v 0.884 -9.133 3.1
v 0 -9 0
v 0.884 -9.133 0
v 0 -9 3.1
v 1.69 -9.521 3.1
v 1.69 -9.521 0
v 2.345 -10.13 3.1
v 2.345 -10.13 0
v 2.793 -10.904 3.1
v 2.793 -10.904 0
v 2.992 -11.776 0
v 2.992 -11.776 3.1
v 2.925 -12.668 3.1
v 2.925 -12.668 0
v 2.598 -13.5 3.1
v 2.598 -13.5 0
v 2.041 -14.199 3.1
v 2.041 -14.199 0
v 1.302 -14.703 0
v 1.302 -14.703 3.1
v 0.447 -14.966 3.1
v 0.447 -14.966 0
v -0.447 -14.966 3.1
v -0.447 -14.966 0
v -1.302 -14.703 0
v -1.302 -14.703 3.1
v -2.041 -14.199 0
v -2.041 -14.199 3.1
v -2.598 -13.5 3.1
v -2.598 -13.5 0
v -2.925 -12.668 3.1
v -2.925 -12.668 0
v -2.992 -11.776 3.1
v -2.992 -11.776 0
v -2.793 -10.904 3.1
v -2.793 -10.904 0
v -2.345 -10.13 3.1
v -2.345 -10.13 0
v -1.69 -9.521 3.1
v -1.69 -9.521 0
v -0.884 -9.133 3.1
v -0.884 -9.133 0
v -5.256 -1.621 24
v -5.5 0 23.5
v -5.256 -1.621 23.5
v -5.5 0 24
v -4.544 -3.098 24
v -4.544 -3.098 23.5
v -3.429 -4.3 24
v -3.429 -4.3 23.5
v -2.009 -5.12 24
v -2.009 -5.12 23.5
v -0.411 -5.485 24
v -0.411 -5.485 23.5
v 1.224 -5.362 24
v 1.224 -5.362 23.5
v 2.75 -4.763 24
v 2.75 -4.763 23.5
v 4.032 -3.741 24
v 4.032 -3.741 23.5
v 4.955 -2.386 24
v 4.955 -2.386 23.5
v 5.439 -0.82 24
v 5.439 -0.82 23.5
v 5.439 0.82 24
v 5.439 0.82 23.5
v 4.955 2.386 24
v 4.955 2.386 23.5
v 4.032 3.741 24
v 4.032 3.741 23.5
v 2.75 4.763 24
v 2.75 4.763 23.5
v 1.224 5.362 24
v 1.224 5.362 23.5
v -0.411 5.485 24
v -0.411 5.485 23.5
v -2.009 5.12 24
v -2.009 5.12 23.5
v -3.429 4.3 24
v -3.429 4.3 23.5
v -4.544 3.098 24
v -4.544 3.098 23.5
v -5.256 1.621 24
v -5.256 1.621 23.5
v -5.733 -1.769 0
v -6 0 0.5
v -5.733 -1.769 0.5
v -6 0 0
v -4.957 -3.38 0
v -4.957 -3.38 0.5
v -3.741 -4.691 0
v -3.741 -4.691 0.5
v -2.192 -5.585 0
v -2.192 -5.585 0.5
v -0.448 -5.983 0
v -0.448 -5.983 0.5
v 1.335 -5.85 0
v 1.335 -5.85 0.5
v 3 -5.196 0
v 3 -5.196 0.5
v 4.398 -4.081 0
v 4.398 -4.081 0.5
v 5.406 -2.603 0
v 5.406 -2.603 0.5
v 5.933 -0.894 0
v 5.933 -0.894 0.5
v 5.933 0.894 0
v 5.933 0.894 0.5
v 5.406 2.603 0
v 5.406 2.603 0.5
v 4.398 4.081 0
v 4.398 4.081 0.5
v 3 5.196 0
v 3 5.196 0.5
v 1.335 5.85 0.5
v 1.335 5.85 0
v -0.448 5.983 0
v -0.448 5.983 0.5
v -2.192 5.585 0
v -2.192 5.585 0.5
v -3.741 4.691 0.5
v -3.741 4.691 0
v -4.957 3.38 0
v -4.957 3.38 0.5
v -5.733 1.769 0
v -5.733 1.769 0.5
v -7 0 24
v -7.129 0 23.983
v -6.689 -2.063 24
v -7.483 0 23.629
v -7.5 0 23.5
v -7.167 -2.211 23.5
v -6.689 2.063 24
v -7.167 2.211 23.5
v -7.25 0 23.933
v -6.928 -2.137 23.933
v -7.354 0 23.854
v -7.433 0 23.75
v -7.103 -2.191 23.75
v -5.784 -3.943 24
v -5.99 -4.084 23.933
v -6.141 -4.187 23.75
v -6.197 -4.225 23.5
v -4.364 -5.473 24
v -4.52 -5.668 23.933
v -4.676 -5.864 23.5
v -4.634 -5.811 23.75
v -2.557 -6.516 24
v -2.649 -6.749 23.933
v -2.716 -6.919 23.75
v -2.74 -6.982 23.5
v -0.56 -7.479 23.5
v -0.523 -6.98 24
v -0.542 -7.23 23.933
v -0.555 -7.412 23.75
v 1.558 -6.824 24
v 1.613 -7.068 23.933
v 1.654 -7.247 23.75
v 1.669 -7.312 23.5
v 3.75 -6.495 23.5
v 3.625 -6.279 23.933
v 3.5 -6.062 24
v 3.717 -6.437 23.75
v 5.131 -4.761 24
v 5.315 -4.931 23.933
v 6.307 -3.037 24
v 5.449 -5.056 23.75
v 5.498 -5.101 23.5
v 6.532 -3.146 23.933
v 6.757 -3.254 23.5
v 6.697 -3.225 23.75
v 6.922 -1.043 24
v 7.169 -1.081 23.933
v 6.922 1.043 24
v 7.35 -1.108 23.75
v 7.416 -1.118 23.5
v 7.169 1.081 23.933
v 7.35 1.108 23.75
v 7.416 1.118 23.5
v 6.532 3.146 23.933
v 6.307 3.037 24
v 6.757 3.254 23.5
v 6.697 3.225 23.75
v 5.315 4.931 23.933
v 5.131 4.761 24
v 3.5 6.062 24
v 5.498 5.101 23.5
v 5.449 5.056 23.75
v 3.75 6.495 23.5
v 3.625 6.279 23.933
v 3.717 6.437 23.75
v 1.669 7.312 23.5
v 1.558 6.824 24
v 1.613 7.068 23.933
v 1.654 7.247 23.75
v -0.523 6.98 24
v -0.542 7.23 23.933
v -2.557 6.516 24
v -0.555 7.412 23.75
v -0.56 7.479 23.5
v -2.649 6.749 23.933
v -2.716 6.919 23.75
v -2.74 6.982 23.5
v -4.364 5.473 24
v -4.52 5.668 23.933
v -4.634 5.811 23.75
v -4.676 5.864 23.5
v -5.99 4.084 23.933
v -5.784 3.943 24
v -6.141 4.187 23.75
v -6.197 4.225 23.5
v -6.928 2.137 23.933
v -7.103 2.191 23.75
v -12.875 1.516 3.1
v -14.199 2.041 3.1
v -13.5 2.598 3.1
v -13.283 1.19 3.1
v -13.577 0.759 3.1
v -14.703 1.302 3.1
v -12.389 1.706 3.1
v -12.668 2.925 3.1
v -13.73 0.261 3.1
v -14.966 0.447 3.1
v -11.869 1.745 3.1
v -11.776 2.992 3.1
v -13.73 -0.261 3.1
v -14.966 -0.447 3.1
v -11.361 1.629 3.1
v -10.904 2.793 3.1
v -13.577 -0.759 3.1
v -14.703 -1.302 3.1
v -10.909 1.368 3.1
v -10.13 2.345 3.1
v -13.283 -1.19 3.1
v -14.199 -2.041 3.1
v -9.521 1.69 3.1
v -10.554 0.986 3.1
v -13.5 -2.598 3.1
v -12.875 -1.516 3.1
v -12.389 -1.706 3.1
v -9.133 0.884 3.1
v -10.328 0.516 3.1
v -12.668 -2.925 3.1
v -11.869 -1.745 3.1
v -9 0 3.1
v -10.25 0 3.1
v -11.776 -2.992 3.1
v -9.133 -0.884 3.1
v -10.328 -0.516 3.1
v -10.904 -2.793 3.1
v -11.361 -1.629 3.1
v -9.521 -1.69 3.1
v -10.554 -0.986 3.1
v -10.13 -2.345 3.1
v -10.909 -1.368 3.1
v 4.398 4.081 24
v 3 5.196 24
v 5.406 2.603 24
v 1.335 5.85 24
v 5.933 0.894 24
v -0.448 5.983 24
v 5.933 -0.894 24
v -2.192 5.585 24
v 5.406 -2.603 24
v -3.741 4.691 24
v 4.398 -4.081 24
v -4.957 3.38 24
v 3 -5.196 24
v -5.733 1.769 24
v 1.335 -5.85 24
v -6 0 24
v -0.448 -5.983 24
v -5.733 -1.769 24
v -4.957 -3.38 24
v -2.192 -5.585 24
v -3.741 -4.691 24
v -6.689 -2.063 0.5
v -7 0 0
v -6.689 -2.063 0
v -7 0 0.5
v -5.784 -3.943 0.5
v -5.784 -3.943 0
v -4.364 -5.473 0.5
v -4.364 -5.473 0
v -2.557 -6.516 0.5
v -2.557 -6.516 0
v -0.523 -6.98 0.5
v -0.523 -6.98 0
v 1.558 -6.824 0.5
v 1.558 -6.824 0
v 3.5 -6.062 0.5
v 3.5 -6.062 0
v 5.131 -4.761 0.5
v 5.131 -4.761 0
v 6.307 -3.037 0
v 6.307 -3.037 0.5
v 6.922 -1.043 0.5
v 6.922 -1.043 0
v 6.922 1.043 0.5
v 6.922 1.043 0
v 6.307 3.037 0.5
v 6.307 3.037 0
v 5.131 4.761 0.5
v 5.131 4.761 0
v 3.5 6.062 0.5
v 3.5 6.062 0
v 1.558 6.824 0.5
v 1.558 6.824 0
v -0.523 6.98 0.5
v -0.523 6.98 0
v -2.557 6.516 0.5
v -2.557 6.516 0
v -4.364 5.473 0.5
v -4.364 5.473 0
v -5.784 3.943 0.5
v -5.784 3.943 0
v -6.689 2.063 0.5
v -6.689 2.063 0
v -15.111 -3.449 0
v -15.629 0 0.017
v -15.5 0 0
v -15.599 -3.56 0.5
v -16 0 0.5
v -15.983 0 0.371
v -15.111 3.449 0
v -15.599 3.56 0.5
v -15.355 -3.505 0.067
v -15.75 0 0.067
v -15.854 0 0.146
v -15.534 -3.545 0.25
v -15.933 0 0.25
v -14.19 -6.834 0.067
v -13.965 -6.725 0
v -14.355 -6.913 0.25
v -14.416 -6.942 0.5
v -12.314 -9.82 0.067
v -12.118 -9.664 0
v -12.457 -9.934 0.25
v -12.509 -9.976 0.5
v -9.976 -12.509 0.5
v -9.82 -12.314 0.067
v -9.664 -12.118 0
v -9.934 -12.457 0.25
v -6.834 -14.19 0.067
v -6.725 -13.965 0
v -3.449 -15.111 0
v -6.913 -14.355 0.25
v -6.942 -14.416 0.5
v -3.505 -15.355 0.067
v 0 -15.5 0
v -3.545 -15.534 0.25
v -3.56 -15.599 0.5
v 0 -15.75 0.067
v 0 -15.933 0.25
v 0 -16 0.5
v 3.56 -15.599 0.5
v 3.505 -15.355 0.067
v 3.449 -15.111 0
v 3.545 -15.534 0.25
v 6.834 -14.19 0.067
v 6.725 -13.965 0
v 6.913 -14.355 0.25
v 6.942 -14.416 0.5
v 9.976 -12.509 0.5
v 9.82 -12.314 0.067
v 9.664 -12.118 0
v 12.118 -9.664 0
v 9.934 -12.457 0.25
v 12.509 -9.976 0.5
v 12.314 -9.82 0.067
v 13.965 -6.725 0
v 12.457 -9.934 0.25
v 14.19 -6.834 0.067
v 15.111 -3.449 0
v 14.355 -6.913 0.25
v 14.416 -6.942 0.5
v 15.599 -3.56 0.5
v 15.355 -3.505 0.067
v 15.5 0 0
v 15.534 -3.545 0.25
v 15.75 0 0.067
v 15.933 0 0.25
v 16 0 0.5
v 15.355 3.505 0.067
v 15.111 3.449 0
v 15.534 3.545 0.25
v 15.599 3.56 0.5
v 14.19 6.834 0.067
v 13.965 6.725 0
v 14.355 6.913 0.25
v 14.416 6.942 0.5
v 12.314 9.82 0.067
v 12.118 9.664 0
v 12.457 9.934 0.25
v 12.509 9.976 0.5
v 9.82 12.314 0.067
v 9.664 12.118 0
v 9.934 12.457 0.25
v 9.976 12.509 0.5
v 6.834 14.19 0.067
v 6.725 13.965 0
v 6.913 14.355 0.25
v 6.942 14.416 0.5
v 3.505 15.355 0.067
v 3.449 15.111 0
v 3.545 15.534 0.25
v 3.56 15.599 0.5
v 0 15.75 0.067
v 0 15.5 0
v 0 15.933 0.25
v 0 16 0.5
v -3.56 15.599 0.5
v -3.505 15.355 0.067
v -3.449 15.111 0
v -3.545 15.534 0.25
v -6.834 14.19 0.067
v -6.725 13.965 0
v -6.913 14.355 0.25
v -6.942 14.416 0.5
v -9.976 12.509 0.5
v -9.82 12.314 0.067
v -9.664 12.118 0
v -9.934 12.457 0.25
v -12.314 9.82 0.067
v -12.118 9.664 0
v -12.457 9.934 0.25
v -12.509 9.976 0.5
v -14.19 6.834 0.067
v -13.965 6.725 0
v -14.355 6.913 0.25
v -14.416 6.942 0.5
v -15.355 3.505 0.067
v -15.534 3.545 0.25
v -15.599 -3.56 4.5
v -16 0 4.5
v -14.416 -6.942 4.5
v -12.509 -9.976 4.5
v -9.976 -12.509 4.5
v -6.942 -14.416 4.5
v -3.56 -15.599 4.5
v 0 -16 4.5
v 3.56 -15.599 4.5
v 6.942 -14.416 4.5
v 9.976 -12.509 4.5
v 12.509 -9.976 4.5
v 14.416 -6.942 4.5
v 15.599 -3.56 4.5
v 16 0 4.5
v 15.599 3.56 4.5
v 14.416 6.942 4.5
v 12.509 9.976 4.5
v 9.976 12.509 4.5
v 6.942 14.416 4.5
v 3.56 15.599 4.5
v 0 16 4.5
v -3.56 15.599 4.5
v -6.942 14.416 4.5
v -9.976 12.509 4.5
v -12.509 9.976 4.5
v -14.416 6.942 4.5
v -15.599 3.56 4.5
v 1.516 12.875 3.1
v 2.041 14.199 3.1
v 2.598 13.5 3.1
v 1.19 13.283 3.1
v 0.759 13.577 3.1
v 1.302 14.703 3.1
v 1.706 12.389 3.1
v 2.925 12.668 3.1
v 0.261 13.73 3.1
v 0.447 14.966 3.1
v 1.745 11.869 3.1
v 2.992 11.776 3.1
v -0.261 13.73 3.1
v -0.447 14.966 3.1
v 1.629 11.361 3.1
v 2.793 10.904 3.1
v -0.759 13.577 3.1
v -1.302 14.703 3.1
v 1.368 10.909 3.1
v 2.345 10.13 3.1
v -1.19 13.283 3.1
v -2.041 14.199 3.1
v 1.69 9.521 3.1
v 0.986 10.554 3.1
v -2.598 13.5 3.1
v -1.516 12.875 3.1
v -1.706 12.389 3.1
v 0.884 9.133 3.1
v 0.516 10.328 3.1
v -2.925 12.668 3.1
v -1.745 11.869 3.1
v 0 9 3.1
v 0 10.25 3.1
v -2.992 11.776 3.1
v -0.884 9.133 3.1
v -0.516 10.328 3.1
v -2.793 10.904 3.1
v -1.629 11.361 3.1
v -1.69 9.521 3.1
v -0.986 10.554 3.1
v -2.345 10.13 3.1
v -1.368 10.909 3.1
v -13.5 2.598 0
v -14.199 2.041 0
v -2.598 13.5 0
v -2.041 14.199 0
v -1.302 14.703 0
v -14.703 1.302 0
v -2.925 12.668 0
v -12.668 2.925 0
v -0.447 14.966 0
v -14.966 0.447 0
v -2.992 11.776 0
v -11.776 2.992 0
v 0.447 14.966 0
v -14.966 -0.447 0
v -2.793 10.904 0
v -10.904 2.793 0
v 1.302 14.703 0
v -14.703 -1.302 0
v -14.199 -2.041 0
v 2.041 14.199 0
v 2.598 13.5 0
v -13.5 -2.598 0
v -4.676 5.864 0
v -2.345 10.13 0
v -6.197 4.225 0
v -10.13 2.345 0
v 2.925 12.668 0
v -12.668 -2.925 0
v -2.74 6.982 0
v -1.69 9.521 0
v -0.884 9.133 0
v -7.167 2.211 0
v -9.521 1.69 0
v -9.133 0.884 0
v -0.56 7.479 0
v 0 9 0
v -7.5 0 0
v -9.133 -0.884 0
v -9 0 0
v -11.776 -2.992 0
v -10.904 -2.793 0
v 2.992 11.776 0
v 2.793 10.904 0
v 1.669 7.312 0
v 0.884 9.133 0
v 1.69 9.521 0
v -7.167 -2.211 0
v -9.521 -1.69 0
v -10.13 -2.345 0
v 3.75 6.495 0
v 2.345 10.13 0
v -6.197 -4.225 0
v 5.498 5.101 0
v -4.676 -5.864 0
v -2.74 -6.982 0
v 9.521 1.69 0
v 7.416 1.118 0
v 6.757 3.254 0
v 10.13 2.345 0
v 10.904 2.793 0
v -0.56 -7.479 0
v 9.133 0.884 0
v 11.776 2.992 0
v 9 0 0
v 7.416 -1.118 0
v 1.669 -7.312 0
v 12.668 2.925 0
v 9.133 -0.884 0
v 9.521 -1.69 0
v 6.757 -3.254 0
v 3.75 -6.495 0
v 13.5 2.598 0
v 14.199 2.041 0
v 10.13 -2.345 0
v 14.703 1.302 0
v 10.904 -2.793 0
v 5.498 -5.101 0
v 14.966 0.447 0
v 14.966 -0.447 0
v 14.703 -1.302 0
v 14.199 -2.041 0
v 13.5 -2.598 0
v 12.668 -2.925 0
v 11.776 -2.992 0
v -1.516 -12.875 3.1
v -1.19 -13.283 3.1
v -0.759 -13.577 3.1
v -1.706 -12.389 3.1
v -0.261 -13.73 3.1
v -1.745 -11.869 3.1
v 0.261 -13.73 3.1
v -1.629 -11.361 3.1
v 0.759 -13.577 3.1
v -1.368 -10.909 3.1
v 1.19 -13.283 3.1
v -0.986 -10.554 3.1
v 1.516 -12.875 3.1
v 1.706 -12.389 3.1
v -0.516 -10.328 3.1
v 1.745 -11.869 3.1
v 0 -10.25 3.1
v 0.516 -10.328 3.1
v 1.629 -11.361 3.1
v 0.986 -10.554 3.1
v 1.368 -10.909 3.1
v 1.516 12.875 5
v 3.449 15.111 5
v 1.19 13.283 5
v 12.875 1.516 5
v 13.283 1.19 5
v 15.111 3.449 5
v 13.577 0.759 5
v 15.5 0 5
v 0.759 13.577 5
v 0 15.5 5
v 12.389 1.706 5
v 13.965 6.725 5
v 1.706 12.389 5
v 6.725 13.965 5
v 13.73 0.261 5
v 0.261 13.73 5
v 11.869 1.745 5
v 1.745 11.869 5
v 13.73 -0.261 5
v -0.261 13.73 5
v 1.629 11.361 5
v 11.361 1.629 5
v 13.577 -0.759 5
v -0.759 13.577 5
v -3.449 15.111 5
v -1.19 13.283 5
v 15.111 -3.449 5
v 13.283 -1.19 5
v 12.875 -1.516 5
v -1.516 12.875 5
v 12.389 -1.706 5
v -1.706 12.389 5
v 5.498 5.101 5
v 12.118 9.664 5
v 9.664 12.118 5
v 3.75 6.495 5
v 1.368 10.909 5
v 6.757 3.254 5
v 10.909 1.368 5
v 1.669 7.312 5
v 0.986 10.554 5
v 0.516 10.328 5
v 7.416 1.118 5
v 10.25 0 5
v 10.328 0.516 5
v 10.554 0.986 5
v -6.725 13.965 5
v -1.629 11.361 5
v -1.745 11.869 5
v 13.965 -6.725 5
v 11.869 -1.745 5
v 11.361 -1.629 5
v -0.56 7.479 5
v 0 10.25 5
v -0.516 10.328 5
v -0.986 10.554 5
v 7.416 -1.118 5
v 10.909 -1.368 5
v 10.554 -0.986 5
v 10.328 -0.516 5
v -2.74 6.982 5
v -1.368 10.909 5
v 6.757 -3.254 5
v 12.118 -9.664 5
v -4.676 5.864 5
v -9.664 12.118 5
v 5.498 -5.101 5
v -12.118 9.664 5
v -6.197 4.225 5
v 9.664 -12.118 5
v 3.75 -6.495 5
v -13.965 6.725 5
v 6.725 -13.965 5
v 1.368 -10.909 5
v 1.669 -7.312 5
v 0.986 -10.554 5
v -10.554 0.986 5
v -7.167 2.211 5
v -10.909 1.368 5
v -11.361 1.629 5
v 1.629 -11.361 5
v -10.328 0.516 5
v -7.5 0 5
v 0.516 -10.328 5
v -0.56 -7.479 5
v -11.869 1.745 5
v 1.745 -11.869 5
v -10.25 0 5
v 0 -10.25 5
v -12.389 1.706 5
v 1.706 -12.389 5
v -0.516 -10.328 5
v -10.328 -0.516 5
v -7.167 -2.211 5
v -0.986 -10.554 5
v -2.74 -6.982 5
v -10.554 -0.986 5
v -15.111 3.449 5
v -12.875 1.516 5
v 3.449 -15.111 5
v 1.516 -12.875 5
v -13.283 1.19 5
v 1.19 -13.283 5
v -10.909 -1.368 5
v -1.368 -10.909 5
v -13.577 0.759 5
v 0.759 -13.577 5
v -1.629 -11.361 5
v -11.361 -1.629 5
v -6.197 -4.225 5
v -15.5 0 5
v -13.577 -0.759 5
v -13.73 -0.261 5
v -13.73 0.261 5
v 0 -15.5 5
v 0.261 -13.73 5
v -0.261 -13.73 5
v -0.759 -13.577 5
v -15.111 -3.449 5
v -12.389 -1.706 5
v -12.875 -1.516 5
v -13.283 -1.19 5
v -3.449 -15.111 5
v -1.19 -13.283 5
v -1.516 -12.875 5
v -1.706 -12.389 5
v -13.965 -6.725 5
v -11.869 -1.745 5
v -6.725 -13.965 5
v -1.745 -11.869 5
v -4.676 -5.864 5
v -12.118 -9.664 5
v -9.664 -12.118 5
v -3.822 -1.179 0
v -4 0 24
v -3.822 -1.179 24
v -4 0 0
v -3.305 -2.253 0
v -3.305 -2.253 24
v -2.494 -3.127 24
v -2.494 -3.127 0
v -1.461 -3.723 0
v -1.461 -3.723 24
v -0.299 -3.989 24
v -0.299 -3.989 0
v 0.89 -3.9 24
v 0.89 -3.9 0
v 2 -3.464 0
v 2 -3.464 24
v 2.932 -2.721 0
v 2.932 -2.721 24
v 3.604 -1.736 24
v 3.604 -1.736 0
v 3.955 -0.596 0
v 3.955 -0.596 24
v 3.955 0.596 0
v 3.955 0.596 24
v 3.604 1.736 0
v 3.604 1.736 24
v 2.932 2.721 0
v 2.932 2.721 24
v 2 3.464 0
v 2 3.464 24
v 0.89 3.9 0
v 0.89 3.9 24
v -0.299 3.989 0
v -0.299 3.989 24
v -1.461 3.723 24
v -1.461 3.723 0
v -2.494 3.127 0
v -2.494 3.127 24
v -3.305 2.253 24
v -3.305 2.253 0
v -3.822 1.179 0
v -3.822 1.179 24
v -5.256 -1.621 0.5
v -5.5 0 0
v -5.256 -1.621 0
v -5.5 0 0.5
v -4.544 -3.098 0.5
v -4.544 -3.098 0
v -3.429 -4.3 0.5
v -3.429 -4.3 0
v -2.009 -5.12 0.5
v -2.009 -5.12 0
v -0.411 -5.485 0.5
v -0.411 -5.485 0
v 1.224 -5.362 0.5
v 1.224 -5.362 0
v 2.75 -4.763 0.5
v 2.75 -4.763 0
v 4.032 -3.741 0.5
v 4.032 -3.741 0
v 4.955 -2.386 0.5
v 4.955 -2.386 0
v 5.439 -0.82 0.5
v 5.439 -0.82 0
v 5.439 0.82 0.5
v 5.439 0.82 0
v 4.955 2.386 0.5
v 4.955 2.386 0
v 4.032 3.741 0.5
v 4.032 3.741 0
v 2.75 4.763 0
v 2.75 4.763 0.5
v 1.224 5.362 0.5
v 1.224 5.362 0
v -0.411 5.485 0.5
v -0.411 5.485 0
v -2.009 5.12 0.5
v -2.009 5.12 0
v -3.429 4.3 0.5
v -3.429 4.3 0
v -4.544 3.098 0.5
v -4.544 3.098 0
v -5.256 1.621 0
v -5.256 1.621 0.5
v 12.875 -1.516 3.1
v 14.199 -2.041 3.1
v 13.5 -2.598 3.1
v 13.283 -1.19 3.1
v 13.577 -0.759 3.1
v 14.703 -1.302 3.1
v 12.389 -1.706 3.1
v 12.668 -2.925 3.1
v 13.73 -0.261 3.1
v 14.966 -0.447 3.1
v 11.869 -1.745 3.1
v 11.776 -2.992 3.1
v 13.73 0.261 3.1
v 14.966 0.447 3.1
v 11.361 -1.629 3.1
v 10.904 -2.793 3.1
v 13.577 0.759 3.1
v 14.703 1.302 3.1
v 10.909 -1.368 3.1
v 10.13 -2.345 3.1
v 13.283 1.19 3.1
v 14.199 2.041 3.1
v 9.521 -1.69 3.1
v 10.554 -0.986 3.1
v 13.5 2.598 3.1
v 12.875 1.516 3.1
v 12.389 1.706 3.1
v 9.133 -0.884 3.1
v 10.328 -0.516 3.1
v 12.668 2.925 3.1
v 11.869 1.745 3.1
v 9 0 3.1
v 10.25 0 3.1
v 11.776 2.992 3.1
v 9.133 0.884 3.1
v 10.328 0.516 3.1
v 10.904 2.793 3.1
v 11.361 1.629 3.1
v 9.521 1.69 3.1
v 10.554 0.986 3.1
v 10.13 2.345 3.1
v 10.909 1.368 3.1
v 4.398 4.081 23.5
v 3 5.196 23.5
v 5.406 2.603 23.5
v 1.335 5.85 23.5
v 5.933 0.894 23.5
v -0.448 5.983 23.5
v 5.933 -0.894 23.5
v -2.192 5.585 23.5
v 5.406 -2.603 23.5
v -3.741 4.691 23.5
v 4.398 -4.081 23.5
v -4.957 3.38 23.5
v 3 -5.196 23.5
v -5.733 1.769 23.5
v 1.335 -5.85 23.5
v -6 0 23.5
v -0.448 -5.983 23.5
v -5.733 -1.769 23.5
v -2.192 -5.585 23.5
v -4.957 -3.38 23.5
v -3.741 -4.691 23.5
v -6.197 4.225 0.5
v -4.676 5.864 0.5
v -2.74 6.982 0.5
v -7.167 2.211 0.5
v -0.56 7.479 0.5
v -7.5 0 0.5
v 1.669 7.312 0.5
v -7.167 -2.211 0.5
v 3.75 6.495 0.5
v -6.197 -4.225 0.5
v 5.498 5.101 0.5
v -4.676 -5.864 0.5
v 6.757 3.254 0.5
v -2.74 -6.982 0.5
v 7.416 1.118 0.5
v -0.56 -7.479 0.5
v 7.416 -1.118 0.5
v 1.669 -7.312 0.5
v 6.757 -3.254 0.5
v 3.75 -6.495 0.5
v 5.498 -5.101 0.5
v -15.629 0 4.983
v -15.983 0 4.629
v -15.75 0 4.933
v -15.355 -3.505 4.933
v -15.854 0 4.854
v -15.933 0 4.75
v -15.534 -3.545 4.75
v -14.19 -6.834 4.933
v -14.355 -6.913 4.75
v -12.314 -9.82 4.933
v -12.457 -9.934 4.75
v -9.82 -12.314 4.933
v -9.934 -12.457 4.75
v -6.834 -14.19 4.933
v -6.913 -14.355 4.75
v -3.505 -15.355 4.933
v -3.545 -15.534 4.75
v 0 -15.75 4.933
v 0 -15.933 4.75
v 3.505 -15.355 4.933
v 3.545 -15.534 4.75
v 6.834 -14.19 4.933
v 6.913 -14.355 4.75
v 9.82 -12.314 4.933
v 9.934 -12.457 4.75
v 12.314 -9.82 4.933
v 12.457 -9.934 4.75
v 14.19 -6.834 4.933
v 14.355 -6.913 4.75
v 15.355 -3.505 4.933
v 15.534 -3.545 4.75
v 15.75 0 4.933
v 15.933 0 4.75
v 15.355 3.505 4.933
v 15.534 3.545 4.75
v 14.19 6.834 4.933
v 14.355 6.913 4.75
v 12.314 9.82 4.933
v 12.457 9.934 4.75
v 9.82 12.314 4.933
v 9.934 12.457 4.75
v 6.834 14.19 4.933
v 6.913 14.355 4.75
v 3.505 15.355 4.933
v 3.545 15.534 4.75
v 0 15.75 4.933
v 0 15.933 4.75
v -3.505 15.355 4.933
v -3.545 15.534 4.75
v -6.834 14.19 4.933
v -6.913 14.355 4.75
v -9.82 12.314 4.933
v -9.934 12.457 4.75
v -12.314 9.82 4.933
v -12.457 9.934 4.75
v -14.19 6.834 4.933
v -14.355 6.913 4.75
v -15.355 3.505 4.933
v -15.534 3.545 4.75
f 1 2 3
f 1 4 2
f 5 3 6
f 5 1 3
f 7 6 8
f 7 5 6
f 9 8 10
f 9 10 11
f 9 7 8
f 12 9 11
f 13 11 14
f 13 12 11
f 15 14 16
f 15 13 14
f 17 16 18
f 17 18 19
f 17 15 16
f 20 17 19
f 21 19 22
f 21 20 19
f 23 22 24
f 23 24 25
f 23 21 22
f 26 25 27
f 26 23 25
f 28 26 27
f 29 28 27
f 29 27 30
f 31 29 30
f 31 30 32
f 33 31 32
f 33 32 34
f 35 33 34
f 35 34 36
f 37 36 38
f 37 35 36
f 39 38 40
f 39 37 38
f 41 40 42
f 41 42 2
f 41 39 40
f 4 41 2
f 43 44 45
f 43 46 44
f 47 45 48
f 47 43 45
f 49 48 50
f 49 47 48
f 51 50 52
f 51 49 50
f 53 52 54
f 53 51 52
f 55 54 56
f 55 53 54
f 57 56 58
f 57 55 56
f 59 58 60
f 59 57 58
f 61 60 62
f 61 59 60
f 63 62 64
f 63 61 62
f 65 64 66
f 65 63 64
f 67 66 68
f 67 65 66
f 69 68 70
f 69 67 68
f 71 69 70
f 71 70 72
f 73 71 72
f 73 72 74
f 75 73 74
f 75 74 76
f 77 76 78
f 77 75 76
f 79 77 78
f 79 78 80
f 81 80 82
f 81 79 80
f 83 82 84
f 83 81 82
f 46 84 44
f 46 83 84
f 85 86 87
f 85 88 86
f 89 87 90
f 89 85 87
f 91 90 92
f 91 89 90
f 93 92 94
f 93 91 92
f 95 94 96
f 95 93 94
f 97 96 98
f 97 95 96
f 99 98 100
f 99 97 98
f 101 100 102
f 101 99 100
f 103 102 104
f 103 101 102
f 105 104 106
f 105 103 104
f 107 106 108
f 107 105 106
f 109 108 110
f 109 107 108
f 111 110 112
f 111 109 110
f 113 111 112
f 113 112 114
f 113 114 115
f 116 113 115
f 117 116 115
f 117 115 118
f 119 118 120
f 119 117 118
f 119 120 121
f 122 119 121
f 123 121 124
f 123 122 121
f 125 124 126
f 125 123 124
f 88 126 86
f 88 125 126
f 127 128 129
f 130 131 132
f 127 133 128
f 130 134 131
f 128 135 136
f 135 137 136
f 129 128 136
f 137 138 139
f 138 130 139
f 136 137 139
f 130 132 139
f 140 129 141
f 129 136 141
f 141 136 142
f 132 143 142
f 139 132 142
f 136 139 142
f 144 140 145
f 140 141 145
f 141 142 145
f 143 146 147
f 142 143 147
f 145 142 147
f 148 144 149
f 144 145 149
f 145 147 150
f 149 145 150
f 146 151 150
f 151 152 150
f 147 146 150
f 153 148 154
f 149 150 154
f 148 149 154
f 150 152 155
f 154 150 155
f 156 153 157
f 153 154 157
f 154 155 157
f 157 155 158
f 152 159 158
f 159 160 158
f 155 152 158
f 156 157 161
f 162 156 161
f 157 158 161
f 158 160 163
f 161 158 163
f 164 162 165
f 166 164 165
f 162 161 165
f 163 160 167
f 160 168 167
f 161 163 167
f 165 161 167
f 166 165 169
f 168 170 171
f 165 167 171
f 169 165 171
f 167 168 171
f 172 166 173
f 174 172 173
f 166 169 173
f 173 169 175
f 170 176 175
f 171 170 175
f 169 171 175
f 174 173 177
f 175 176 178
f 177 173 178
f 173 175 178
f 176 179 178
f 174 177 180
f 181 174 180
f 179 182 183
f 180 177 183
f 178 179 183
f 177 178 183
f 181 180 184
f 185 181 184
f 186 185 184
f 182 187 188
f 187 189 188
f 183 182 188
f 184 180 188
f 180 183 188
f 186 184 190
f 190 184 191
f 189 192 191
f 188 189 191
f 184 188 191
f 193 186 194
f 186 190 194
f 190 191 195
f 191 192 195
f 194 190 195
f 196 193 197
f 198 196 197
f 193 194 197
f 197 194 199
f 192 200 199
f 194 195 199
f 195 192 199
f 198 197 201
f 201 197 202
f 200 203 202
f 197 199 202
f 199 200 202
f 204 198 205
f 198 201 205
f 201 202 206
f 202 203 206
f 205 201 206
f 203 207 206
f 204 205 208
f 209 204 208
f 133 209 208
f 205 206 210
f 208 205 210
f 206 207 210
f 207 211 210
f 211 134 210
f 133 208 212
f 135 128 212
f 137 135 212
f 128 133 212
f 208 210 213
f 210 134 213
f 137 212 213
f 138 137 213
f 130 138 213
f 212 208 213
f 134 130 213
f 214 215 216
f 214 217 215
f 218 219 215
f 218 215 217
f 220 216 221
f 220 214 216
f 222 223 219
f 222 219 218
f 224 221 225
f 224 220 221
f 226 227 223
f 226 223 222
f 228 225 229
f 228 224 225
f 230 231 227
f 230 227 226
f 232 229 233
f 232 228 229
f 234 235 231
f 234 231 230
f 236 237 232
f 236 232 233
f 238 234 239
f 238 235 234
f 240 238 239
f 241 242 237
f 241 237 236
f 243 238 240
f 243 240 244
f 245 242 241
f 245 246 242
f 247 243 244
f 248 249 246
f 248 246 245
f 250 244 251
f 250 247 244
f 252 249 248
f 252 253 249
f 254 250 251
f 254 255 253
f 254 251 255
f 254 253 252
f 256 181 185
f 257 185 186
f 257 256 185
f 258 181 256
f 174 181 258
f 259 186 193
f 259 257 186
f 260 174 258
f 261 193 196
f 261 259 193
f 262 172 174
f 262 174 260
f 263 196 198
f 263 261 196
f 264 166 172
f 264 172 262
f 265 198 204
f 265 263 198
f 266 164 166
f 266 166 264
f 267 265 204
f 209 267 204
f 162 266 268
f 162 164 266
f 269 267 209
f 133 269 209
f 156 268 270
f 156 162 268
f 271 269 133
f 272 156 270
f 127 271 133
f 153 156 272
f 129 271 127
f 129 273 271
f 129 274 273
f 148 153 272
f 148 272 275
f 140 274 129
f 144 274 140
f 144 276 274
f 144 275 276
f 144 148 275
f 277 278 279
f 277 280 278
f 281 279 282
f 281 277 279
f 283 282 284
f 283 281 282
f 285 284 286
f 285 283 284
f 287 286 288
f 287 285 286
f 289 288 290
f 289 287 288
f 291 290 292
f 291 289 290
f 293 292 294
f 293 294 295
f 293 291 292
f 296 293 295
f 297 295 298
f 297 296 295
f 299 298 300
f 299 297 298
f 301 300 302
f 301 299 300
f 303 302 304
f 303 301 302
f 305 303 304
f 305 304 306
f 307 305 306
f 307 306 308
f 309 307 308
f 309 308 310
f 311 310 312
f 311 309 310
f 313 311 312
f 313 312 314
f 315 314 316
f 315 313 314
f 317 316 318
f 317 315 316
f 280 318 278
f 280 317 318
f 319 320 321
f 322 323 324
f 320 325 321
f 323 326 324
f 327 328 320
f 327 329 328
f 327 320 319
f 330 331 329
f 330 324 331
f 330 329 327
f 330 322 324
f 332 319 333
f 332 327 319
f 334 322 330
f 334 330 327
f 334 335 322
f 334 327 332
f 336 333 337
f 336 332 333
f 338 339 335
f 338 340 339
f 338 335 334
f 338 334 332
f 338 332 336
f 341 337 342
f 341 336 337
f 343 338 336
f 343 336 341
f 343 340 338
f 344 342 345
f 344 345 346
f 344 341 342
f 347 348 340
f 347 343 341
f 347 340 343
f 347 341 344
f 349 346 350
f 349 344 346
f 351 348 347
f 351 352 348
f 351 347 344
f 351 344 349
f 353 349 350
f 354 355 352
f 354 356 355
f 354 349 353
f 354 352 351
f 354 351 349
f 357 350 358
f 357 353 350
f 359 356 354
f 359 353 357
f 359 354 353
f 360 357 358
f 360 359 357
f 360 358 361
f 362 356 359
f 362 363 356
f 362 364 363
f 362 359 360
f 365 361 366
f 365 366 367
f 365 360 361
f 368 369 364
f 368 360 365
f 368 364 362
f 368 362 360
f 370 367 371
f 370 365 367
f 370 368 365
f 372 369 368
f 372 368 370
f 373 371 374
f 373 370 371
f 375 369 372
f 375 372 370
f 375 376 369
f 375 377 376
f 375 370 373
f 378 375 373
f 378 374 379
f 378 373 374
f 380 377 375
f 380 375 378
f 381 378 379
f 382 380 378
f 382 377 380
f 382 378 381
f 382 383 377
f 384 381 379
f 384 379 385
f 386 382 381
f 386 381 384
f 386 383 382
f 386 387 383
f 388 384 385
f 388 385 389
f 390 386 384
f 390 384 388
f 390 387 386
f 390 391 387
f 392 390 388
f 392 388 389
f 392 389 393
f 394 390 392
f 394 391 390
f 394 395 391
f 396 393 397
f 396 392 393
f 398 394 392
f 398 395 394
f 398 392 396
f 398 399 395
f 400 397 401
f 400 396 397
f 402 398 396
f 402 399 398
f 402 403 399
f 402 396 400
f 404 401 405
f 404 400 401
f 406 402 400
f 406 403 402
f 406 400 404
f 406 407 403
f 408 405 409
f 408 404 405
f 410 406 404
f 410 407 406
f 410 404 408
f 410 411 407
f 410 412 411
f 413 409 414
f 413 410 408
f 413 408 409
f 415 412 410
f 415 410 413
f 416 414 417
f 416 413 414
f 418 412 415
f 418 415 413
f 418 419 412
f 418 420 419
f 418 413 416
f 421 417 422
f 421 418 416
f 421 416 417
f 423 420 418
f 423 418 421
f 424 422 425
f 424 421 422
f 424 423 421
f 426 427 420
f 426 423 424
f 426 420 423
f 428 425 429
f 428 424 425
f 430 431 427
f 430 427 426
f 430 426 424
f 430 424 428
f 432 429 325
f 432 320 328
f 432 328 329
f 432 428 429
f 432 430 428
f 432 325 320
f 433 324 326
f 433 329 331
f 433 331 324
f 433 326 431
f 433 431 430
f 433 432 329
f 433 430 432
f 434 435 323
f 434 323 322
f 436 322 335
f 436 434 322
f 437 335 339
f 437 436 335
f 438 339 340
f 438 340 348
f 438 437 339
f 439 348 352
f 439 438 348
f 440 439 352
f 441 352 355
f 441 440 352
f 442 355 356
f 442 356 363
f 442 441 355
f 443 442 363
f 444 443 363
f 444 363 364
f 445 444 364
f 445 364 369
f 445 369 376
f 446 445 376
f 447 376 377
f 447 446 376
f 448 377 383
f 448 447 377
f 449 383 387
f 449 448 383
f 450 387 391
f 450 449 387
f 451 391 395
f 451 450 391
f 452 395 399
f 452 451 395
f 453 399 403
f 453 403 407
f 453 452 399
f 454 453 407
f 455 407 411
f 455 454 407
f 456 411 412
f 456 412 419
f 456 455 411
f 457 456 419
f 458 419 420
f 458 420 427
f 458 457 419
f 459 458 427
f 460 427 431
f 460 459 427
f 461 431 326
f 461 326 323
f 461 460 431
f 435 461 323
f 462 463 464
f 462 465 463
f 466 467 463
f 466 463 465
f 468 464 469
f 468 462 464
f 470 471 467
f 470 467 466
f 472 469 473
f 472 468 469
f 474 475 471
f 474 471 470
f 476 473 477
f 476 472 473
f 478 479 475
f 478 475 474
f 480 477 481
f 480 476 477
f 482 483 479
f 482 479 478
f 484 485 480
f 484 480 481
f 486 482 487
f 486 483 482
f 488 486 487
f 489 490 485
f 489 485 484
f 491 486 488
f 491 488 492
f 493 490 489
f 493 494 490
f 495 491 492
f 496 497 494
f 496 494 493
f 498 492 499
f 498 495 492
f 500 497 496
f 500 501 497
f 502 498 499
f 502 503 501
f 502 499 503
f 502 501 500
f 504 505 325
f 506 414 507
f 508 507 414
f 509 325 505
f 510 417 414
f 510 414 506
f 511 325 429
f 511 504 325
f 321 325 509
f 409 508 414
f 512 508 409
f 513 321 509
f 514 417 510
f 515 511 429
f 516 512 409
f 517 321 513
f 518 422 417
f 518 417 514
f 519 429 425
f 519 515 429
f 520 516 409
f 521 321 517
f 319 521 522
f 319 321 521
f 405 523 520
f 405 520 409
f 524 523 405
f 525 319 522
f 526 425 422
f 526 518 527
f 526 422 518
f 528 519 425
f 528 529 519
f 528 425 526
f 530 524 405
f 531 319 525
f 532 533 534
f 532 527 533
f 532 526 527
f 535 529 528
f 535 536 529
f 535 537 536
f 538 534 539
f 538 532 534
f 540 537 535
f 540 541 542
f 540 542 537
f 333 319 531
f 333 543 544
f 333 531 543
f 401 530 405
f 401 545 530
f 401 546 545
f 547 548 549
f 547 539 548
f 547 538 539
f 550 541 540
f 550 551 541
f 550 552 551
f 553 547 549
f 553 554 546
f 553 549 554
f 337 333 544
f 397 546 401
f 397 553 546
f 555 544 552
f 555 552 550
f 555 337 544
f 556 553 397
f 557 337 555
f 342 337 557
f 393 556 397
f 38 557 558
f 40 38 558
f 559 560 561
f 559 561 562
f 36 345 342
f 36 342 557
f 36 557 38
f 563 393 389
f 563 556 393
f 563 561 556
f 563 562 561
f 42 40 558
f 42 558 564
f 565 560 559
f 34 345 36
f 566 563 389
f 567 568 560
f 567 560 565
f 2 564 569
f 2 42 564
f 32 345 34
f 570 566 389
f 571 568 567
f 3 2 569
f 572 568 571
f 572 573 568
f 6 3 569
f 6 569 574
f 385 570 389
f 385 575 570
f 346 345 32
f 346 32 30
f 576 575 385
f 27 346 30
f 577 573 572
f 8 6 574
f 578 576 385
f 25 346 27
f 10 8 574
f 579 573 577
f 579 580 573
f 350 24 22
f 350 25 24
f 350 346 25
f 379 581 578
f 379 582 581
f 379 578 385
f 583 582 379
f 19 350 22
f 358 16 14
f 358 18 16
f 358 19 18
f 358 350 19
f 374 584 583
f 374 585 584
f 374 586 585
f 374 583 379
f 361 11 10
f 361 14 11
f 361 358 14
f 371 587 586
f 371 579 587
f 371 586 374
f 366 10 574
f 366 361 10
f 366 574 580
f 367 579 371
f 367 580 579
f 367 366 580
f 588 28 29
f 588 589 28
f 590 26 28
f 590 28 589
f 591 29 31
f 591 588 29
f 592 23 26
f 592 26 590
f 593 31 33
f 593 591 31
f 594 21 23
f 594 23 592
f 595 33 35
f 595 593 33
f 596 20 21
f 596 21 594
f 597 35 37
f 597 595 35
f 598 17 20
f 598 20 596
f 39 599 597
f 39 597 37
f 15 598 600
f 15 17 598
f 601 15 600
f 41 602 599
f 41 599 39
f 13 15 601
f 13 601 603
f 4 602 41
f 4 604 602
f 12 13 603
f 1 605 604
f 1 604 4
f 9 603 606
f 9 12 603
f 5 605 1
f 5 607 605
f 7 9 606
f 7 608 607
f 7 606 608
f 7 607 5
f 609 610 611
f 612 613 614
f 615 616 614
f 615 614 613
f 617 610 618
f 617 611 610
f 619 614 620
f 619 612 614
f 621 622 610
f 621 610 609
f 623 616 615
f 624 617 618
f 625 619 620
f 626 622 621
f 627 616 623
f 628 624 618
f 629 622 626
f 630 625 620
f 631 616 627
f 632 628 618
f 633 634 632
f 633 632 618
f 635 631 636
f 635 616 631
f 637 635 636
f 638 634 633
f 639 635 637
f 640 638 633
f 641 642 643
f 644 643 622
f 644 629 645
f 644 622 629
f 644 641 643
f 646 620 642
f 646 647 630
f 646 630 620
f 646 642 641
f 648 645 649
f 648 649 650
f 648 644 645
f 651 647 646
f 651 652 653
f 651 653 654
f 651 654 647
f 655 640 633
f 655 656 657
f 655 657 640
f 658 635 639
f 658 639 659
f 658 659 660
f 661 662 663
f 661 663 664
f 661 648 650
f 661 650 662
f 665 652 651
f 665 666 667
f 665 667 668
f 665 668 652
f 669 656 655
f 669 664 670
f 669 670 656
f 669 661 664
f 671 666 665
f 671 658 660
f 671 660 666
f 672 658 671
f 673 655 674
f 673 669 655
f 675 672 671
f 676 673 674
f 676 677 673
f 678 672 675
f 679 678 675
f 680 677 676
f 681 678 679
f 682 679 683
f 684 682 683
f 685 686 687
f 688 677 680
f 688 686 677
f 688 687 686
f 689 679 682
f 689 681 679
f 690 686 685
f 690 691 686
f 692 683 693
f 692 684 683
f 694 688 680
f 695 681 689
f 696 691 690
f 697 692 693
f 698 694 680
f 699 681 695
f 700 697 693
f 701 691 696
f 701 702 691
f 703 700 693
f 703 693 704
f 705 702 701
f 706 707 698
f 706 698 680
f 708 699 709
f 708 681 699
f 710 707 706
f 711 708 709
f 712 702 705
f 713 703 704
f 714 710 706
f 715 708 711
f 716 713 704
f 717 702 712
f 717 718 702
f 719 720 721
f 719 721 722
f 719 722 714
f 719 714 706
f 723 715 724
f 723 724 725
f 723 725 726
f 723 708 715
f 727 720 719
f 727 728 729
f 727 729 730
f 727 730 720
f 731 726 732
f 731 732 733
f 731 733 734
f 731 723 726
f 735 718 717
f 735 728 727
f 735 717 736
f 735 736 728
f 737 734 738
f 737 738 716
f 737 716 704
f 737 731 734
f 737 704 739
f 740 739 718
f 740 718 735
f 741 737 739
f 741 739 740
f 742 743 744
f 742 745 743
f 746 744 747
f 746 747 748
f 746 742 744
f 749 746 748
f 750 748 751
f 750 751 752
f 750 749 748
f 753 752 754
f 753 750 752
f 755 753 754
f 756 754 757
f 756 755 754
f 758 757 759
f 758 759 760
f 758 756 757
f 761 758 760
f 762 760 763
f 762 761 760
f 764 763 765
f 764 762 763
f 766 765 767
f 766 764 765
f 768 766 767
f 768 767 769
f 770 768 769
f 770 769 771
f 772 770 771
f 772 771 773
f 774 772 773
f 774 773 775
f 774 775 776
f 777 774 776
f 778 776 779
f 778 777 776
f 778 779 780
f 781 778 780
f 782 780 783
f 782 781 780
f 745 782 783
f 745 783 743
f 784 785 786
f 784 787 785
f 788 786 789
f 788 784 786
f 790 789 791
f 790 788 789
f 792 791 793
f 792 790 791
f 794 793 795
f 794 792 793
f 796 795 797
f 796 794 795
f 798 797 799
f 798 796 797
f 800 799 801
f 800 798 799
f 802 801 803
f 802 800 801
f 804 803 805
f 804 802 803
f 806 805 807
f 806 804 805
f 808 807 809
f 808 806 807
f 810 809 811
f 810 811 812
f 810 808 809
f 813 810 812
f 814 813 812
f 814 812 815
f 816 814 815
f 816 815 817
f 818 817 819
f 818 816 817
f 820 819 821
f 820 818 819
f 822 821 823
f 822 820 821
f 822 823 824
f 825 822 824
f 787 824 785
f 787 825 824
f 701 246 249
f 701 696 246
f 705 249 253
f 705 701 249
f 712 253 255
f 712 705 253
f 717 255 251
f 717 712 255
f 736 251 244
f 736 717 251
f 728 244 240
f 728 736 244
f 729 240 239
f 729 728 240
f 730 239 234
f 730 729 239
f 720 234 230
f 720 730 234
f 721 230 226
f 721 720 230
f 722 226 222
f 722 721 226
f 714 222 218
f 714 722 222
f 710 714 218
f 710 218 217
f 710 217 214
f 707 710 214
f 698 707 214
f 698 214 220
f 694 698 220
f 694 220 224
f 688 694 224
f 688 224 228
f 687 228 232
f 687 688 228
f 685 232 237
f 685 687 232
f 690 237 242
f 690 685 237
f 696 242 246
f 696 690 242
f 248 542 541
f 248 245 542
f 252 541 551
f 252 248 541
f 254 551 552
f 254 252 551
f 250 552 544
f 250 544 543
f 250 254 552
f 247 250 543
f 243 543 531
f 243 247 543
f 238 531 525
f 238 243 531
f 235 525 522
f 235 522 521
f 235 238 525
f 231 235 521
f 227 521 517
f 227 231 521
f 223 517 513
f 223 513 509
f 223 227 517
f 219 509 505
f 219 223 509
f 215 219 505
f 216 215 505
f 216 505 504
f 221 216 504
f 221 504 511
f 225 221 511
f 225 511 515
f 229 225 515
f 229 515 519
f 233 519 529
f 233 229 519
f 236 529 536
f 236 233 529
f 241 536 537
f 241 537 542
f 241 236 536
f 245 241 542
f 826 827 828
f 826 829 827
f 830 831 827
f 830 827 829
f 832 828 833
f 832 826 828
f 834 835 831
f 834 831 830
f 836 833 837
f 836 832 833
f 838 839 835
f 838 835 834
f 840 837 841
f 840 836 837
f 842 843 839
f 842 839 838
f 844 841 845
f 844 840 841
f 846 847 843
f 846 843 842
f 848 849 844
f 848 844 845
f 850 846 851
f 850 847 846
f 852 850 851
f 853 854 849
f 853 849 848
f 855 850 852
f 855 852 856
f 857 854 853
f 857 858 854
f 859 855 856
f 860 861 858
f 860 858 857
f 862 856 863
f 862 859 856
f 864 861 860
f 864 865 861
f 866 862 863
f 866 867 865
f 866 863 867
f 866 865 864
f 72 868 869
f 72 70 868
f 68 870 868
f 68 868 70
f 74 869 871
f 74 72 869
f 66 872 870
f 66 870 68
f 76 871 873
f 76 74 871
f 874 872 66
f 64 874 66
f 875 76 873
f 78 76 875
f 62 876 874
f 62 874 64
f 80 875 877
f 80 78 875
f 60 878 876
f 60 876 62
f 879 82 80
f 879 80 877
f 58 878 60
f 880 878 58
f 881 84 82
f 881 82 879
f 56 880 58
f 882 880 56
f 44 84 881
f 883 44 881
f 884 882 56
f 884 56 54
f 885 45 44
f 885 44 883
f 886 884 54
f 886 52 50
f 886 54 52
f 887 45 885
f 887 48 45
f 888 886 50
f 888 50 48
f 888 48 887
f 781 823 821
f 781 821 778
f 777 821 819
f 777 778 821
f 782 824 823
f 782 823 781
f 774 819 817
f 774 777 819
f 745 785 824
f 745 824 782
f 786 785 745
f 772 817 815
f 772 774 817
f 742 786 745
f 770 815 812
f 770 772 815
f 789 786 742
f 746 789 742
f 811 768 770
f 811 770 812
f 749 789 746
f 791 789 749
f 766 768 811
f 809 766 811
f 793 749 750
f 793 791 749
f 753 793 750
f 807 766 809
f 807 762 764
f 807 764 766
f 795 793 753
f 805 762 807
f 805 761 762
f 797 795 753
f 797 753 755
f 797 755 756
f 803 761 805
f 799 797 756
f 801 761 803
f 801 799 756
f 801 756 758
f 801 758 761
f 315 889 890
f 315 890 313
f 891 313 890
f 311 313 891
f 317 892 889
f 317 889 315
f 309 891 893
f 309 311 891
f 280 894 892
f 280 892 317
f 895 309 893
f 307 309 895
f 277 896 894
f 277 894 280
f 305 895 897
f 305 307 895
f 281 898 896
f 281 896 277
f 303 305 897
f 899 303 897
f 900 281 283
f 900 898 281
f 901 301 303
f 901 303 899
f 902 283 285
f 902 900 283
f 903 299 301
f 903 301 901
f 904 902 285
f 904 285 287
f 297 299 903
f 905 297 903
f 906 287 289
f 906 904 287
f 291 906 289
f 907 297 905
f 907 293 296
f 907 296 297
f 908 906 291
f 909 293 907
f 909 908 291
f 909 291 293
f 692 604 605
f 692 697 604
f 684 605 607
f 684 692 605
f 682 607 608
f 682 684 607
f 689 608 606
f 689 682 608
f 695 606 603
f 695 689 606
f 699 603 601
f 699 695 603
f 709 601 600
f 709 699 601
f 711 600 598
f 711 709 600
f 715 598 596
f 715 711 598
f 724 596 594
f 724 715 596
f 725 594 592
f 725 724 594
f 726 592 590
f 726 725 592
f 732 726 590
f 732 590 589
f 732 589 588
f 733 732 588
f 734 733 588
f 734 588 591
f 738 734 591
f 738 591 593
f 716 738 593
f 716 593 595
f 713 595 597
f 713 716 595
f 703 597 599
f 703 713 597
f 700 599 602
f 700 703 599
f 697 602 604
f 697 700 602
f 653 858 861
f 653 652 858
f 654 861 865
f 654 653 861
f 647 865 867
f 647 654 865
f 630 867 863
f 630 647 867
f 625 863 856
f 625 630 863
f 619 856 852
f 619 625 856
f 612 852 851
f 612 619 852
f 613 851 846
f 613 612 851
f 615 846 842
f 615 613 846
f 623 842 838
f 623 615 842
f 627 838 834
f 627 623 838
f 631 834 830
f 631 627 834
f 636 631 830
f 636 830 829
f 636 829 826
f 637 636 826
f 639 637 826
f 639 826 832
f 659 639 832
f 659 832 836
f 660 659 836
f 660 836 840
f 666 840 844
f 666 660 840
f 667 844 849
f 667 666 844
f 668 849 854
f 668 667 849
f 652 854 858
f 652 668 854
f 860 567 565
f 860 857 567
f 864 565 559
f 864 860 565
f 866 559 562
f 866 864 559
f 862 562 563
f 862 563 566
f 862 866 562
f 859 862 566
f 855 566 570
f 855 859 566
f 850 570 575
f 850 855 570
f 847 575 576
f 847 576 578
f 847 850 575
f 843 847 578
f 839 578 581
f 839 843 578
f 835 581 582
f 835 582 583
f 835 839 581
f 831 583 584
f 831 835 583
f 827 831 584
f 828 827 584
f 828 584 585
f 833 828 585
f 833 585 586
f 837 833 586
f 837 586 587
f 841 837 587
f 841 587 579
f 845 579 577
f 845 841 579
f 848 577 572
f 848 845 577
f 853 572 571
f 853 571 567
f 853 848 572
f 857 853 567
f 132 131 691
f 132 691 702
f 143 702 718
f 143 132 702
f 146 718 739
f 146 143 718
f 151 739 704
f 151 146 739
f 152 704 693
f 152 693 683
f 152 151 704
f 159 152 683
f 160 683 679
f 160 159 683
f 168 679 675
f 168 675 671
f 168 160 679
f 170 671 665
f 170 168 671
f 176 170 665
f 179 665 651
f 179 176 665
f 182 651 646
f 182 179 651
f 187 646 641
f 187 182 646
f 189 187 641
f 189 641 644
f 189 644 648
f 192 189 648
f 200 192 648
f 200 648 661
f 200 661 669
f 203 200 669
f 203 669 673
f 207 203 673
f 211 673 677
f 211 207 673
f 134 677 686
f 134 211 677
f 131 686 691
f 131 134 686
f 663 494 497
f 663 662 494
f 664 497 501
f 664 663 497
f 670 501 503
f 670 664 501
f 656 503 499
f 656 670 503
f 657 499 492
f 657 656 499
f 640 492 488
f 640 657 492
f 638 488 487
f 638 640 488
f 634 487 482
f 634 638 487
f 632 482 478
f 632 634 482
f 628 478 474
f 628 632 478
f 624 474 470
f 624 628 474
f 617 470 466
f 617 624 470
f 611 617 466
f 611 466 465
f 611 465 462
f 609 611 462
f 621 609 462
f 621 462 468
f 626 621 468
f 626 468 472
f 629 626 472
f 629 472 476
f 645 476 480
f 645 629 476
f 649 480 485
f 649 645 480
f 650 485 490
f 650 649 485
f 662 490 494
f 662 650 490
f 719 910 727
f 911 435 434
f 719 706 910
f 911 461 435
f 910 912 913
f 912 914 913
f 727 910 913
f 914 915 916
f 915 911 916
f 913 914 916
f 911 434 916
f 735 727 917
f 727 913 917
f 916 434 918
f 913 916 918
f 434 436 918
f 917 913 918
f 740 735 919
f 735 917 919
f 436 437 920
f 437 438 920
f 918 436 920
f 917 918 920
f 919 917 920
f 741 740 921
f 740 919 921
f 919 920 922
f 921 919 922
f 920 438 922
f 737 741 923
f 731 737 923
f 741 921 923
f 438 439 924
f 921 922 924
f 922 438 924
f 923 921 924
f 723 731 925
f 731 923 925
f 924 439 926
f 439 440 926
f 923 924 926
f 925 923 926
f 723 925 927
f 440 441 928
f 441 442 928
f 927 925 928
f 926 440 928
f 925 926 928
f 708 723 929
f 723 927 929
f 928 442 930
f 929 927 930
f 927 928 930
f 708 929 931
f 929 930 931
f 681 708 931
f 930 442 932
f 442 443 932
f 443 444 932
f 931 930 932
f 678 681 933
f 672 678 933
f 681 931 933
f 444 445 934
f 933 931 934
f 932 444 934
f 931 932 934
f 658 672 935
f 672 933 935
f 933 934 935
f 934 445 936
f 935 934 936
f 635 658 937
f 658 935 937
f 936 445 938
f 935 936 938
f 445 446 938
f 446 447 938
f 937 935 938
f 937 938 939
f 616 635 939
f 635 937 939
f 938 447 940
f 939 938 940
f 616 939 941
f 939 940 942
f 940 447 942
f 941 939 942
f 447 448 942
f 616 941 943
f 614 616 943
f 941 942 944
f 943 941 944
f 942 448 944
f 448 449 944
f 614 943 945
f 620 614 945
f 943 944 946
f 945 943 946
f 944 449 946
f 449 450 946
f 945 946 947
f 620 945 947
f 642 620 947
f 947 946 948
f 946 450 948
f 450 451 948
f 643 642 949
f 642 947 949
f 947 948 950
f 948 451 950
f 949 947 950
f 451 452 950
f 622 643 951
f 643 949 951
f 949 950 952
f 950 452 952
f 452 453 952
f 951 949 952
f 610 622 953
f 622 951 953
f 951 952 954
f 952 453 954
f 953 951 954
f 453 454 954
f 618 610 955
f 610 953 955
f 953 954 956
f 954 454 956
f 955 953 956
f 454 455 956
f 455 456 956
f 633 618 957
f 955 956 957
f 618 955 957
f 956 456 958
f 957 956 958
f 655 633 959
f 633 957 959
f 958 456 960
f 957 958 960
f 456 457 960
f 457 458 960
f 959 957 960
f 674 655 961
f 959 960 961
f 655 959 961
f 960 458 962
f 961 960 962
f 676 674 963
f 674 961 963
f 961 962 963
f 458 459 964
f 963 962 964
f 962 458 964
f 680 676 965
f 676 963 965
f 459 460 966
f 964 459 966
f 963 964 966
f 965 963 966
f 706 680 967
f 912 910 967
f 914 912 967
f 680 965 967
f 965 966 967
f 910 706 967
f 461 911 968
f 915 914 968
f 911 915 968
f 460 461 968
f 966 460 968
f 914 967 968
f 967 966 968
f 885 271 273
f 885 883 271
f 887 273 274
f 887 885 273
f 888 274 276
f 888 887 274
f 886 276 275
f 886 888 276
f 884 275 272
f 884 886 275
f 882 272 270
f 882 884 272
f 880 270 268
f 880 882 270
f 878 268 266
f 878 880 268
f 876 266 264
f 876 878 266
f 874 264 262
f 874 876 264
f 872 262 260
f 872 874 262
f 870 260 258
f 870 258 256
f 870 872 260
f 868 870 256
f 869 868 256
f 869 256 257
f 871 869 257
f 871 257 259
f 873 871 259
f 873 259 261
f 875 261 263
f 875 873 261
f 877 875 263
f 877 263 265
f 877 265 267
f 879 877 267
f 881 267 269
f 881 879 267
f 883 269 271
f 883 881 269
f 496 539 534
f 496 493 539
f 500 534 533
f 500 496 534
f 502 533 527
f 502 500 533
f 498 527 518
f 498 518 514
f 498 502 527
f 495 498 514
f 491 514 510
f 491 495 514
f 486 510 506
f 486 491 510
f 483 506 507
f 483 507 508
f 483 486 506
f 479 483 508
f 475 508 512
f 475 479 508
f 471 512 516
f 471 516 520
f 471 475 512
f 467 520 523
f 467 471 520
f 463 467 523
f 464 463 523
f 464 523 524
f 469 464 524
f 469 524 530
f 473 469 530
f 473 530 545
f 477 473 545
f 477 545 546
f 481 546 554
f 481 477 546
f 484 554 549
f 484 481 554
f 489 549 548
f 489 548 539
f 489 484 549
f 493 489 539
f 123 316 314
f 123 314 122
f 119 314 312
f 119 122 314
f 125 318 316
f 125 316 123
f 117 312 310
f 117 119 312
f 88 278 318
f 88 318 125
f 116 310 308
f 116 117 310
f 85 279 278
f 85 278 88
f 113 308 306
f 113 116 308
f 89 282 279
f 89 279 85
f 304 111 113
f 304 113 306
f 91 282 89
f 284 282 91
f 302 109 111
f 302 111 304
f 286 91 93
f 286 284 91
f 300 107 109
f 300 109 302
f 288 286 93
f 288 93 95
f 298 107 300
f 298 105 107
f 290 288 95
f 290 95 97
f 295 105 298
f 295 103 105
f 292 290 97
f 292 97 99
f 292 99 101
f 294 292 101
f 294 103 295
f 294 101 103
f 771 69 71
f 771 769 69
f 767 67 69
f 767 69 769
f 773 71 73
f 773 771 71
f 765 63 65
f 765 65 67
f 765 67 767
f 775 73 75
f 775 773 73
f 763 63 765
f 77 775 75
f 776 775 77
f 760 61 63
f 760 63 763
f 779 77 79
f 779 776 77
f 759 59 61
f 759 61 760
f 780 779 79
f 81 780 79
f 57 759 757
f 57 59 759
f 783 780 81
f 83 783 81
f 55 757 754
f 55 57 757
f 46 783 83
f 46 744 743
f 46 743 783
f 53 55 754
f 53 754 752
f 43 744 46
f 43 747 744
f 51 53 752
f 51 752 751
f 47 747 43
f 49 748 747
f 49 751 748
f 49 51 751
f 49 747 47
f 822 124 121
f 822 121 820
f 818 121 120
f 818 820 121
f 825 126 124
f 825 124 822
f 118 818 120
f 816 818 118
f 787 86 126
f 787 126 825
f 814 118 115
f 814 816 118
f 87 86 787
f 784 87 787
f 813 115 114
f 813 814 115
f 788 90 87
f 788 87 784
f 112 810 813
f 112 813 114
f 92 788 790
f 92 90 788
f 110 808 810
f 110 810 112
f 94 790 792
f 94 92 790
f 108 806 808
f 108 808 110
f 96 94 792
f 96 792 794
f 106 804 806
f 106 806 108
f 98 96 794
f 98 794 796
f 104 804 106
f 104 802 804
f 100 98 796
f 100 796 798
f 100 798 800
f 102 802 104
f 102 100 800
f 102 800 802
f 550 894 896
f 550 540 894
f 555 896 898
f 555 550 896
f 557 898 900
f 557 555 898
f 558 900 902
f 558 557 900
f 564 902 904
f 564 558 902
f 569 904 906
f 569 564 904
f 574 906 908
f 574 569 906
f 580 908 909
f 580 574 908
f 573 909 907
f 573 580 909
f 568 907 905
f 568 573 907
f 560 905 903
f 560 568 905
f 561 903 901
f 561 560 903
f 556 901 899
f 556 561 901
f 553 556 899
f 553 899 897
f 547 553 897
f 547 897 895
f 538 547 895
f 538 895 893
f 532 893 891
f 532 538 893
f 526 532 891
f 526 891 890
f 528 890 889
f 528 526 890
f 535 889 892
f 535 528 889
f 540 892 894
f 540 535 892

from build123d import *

# Parameters (mm, degrees)
PADR_OCIRCULAR1_COUNT = 4
FILETE1_R             = 0.5


with BuildPart() as part:
    # Esboço1 → Revolução1 (revolve)
    with BuildSketch(Plane(origin=(0, 0, 0), x_dir=(0, 0, -1), z_dir=(1, 0, 0)), mode=Mode.PRIVATE) as revolu_o1_sk:
        Polygon((0, 4), (0, 5.5), (-0.5, 5.5), (-0.5, 6), (0, 6), (0, 7), (-0.5, 7), (-0.5, 7.5), (0, 7.5), (0, 16), (-5, 16), (-5, 7.5), (-24, 7.5), (-24, 6), (-23.5, 6), (-23.5, 5.5), (-24, 5.5), (-24, 4), align=None)
    revolve(revolu_o1_sk.sketch.rotate(Axis((0, 0, 0), (0, 0, 1)), 90), axis=Axis((0, 0, 0), (0, 0, 1)))  # turned: the seam where the file's is

    # Esboço5 → Corte-Revolução1 (revolve, cut)
    with BuildSketch(Plane(origin=(0, 0, 0), x_dir=(0, 0, -1), z_dir=(1, 0, 0)), mode=Mode.PRIVATE) as corte_revolu_o1_sk:
        Polygon((0, 15), (-3.1, 15), (-3.1, 13.75), (-5, 13.75), (-5, 12), (0, 12), align=None)
    corte_revolu_o1 = revolve(corte_revolu_o1_sk.sketch.rotate(Axis((0, 12, 0), (0, 0, -1)), 180), axis=Axis((0, 12, 0), (0, 0, -1)), mode=Mode.SUBTRACT)  # turned: the seam where the file's is

    # PadrãoCircular1: Corte-Revolução1 ×4 about axis
    padr_ocircular1_axis = Axis((0, 0, 0), (0, 0, 1))
    for i in range(1, PADR_OCIRCULAR1_COUNT):
        add(corte_revolu_o1.rotate(padr_ocircular1_axis, i * 360 / PADR_OCIRCULAR1_COUNT), mode=Mode.SUBTRACT)

    # Filete1
    filete1_edges = [part.edges().sort_by_distance(p)[0] for p in [
        (7.5, 0, 24),
        (16, 0, 5),
        (16, 0, 0),
    ]]
    fillet(filete1_edges, radius=FILETE1_R)


solid = part.part
